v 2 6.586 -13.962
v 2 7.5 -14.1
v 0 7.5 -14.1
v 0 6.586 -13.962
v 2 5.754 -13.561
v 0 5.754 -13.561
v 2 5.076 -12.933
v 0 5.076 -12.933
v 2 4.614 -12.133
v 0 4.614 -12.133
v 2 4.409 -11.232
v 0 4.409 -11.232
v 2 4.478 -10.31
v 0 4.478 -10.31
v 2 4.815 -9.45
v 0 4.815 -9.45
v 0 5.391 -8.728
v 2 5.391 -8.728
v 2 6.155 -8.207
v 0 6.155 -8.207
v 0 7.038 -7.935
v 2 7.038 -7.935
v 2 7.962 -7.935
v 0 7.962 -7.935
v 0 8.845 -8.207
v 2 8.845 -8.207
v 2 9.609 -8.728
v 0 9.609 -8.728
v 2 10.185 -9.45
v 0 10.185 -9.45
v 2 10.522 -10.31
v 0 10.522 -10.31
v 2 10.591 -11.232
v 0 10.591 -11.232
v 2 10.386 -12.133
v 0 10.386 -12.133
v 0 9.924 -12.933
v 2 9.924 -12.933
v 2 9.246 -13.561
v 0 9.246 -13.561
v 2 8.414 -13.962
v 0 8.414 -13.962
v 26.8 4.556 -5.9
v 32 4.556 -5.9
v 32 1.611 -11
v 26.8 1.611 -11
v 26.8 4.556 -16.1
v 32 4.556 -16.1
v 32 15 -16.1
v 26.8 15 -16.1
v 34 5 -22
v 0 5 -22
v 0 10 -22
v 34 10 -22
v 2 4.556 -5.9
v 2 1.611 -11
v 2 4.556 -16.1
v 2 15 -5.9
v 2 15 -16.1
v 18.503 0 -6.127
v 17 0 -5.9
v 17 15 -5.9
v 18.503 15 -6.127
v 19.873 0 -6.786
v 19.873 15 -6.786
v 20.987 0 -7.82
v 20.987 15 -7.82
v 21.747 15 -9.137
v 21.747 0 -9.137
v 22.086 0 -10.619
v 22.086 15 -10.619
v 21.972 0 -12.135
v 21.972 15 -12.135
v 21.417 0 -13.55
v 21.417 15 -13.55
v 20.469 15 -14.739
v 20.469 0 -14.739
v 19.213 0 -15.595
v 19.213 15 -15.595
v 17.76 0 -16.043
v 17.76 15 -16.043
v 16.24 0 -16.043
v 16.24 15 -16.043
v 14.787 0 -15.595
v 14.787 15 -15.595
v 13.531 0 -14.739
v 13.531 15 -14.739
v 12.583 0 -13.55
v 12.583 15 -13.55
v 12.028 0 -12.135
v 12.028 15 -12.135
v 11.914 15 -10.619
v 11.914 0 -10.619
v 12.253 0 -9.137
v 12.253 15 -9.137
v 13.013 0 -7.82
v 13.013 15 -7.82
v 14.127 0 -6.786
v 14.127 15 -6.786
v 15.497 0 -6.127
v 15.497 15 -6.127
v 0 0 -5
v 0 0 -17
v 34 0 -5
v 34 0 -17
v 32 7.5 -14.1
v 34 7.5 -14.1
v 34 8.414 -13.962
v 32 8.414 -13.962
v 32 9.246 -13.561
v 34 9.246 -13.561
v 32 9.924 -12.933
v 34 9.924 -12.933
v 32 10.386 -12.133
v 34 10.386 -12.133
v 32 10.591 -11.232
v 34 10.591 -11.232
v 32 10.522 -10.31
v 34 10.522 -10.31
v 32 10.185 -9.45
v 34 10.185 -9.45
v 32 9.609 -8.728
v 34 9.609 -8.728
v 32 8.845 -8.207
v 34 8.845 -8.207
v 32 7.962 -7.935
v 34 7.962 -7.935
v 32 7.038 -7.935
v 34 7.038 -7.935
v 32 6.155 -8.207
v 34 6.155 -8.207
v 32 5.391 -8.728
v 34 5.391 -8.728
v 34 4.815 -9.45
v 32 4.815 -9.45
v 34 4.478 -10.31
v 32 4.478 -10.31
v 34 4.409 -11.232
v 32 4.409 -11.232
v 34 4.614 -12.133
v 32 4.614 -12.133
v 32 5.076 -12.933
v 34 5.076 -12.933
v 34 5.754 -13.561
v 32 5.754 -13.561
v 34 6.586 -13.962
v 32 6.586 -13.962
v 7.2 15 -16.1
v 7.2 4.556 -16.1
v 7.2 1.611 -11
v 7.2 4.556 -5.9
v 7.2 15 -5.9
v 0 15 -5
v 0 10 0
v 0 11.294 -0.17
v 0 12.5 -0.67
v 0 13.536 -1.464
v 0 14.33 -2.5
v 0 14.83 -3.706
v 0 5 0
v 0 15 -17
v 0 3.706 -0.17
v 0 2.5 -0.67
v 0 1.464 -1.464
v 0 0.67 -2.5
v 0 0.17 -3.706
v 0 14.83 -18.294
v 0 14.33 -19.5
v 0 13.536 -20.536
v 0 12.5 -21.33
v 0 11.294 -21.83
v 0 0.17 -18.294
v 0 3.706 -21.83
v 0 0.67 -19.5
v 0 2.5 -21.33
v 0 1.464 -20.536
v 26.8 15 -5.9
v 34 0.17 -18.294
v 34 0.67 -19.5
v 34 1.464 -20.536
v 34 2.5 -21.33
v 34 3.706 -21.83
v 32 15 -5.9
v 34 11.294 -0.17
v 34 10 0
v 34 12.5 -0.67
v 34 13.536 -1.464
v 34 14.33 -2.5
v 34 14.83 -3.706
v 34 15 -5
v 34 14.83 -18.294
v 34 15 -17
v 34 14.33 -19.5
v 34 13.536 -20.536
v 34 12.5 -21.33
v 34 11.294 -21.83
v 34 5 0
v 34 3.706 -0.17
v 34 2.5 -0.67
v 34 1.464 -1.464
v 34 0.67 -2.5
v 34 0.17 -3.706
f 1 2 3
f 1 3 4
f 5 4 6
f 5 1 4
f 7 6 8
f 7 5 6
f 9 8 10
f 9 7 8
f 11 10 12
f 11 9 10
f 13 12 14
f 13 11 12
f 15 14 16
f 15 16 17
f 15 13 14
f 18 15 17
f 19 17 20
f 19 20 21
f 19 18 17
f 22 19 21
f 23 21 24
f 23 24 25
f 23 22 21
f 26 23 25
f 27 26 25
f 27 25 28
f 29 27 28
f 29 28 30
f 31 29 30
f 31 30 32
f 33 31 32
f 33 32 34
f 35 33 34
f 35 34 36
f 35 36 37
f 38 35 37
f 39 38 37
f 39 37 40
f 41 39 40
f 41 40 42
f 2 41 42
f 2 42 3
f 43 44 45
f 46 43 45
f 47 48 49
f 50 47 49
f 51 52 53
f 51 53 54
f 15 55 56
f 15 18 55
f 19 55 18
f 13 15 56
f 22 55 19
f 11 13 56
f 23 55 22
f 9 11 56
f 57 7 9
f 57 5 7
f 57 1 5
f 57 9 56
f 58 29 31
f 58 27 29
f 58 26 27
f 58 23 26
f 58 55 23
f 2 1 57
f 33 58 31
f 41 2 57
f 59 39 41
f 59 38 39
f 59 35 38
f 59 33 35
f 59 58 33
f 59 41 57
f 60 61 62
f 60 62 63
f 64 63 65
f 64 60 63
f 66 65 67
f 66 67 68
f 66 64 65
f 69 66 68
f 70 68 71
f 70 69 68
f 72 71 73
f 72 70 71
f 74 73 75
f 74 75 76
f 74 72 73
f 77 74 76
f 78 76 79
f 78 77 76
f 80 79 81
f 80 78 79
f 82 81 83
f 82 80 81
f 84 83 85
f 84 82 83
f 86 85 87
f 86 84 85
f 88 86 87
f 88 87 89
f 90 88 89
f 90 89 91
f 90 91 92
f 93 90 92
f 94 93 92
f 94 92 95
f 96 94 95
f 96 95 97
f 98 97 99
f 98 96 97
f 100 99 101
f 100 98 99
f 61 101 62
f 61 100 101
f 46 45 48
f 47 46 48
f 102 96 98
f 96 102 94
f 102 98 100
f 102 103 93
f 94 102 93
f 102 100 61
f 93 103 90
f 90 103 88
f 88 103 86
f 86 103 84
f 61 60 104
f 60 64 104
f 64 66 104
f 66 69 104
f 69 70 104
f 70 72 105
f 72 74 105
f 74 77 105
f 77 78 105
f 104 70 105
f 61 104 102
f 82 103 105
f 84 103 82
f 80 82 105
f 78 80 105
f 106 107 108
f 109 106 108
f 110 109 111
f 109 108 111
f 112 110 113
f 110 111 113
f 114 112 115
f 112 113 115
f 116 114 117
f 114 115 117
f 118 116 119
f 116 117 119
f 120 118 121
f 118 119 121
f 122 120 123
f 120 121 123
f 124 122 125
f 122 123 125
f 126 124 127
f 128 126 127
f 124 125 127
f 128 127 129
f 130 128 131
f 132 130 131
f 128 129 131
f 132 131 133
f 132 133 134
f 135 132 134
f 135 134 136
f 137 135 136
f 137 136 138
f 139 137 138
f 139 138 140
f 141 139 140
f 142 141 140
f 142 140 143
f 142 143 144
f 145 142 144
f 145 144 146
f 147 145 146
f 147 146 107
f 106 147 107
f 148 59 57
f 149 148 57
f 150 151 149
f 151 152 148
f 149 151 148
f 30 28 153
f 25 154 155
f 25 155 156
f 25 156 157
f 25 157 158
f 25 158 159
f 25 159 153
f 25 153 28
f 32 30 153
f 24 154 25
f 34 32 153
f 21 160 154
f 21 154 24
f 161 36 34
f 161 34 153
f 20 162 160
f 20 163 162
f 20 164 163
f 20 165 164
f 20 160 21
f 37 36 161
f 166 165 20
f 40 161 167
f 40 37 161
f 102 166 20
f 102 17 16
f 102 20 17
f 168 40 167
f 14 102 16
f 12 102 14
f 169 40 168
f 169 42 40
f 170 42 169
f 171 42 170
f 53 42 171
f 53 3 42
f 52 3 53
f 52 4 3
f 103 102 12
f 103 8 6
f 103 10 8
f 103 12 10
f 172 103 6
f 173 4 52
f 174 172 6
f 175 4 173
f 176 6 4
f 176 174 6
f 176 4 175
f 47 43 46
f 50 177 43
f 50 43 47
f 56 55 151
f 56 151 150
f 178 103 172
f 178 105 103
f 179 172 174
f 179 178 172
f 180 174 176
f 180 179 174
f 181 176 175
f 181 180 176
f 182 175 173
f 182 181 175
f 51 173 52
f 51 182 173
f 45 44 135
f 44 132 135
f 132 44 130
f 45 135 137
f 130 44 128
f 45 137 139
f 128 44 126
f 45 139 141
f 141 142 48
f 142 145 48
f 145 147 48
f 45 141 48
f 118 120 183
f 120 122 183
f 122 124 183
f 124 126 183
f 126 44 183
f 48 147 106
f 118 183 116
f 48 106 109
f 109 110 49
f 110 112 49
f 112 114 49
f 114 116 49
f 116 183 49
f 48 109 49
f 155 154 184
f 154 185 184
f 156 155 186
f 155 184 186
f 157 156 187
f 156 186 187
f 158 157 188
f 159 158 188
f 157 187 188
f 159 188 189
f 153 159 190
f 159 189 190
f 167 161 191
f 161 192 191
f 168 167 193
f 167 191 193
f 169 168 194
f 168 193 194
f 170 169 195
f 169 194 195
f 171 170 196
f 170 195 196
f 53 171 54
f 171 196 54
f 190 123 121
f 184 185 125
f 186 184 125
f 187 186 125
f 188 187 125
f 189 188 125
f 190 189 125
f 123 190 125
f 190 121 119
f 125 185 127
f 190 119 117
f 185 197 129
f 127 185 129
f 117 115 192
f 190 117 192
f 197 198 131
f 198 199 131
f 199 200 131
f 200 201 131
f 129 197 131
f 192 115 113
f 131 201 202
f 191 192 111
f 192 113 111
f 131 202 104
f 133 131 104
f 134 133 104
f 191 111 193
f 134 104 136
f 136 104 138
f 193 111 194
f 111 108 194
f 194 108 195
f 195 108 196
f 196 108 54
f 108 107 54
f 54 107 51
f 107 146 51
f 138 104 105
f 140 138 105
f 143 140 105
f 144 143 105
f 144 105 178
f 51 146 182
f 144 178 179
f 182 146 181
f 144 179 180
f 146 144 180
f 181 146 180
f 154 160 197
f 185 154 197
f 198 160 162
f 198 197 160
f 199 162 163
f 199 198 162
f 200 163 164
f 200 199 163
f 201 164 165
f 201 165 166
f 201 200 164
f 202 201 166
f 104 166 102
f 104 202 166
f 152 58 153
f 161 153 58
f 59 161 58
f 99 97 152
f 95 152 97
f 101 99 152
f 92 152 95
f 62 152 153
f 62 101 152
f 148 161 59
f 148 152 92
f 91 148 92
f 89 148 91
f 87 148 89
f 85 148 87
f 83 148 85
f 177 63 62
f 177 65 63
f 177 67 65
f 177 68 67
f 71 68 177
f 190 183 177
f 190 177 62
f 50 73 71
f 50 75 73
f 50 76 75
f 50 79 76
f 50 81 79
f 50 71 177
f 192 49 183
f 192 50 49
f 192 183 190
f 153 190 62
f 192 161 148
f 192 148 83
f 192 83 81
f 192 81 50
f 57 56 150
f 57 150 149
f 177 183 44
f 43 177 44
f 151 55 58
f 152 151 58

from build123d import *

# Parameters (mm, degrees)
CROQUIS1_W              = 34
CROQUIS1_H              = 22
CROQUIS1_R              = 5.1
SALIENTE_EXTRUIR1_DEPTH = 15
CORTAR_EXTRUIR1_DEPTH   = 5.2
CORTAR_EXTRUIR2_DEPTH   = 5.2
CROQUIS5_R              = 3.1
CORTAR_EXTRUIR4_DEPTH   = 4
CORTAR_EXTRUIR5_START   = -4
CROQUIS6_R              = 3.1
CORTAR_EXTRUIR5_DEPTH   = 4
REDONDEO1_R             = 5


with BuildPart() as part:
    # Croquis1 → Saliente-Extruir1 (new body)
    with BuildSketch(Plane(origin=(0, 0, 0), x_dir=(1, 0, 0), z_dir=(0, 1, 0))):
        with Locations((17, 11)):
            Rectangle(CROQUIS1_W, CROQUIS1_H)
        with Locations(Location((17, 11, 0), (0, 0, 270))):
            Circle(CROQUIS1_R, mode=Mode.SUBTRACT)
    extrude(amount=SALIENTE_EXTRUIR1_DEPTH)

    # Croquis2 → Cortar-Extruir1 (cut)
    with BuildSketch(Plane.ZY.offset(-2)):
        Polygon((-16.1, 10.444486373), (-16.1, 15), (-5.9, 15), (-5.9, 10.444486373), (-5.9, 4.555513627), (-11, 1.611027254), (-16.1, 4.555513627), align=None)
    extrude(amount=-CORTAR_EXTRUIR1_DEPTH, mode=Mode.SUBTRACT)

    # Croquis3 → Cortar-Extruir2 (cut)
    with BuildSketch(Plane(origin=(32, 0, 0), x_dir=(0, 0, -1), z_dir=(1, 0, 0))):
        Polygon((5.9, 15), (5.9, 4.555513627), (11, 1.611027254), (16.1, 4.555513627), (16.1, 15), align=None)
    extrude(amount=-CORTAR_EXTRUIR2_DEPTH, mode=Mode.SUBTRACT)

    # Croquis5 → Cortar-Extruir4 (cut)
    with BuildSketch(Plane(origin=(34, 0, 0), x_dir=(0, 0, -1), z_dir=(1, 0, 0))):
        with Locations((11, 7.5)):
            Circle(CROQUIS5_R)
    extrude(amount=-CORTAR_EXTRUIR4_DEPTH, mode=Mode.SUBTRACT)

    # Croquis6 → Cortar-Extruir5 (cut)
    with BuildSketch(Plane.ZY.offset(CORTAR_EXTRUIR5_START)):
        with Locations(Location((-11, 7.5, 0), (0, 0, 180))):
            Circle(CROQUIS6_R)
    extrude(amount=CORTAR_EXTRUIR5_DEPTH, mode=Mode.SUBTRACT)

    # Redondeo1
    redondeo1_edges = [part.edges().sort_by_distance(p)[0] for p in [
        (17, 15, -22),
        (17, 0, -22),
        (17, 0, 0),
        (17, 15, 0),
    ]]
    fillet(redondeo1_edges, radius=REDONDEO1_R)


solid = part.part
